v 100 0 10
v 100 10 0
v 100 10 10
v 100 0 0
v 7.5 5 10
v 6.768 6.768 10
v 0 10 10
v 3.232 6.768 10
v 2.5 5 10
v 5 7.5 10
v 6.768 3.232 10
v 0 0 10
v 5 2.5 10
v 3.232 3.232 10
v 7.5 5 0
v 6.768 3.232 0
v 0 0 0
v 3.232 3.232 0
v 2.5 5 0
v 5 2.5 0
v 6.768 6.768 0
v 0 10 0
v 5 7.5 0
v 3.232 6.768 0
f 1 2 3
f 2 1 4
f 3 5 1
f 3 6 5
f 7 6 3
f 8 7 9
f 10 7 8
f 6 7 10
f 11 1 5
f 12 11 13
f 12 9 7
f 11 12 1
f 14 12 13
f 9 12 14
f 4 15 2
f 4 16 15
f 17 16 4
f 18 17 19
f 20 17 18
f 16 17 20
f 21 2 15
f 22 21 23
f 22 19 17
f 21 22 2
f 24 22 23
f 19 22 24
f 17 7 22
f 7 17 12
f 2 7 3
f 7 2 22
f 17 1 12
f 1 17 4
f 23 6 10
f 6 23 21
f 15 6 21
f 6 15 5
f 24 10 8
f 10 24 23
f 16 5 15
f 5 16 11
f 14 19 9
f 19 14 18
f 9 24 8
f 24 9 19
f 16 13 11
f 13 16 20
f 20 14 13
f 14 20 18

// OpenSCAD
// Размеры бруска
length = 100;
width = 10;

height = 10;

// Параметры отверстия
hole_diameter = 5;
hole_radius = hole_diameter / 2;

hole_position = 5; // Расстояние от одного из краев

hole2_position = length - 5; // Расстояние от одного из краев

// Создаем брусок
difference() {
    // Основной брусок
    cube([length, width, height], center = false);
    
    // Отверстие
    translate([hole_position, width / 2, height / 2])
        cylinder(h = height, r = hole_radius, center = true);
    
//    translate([hole2_position, width / 2, height / 2])
//        cylinder(h = height, r = hole_radius, center = true);
    
}
